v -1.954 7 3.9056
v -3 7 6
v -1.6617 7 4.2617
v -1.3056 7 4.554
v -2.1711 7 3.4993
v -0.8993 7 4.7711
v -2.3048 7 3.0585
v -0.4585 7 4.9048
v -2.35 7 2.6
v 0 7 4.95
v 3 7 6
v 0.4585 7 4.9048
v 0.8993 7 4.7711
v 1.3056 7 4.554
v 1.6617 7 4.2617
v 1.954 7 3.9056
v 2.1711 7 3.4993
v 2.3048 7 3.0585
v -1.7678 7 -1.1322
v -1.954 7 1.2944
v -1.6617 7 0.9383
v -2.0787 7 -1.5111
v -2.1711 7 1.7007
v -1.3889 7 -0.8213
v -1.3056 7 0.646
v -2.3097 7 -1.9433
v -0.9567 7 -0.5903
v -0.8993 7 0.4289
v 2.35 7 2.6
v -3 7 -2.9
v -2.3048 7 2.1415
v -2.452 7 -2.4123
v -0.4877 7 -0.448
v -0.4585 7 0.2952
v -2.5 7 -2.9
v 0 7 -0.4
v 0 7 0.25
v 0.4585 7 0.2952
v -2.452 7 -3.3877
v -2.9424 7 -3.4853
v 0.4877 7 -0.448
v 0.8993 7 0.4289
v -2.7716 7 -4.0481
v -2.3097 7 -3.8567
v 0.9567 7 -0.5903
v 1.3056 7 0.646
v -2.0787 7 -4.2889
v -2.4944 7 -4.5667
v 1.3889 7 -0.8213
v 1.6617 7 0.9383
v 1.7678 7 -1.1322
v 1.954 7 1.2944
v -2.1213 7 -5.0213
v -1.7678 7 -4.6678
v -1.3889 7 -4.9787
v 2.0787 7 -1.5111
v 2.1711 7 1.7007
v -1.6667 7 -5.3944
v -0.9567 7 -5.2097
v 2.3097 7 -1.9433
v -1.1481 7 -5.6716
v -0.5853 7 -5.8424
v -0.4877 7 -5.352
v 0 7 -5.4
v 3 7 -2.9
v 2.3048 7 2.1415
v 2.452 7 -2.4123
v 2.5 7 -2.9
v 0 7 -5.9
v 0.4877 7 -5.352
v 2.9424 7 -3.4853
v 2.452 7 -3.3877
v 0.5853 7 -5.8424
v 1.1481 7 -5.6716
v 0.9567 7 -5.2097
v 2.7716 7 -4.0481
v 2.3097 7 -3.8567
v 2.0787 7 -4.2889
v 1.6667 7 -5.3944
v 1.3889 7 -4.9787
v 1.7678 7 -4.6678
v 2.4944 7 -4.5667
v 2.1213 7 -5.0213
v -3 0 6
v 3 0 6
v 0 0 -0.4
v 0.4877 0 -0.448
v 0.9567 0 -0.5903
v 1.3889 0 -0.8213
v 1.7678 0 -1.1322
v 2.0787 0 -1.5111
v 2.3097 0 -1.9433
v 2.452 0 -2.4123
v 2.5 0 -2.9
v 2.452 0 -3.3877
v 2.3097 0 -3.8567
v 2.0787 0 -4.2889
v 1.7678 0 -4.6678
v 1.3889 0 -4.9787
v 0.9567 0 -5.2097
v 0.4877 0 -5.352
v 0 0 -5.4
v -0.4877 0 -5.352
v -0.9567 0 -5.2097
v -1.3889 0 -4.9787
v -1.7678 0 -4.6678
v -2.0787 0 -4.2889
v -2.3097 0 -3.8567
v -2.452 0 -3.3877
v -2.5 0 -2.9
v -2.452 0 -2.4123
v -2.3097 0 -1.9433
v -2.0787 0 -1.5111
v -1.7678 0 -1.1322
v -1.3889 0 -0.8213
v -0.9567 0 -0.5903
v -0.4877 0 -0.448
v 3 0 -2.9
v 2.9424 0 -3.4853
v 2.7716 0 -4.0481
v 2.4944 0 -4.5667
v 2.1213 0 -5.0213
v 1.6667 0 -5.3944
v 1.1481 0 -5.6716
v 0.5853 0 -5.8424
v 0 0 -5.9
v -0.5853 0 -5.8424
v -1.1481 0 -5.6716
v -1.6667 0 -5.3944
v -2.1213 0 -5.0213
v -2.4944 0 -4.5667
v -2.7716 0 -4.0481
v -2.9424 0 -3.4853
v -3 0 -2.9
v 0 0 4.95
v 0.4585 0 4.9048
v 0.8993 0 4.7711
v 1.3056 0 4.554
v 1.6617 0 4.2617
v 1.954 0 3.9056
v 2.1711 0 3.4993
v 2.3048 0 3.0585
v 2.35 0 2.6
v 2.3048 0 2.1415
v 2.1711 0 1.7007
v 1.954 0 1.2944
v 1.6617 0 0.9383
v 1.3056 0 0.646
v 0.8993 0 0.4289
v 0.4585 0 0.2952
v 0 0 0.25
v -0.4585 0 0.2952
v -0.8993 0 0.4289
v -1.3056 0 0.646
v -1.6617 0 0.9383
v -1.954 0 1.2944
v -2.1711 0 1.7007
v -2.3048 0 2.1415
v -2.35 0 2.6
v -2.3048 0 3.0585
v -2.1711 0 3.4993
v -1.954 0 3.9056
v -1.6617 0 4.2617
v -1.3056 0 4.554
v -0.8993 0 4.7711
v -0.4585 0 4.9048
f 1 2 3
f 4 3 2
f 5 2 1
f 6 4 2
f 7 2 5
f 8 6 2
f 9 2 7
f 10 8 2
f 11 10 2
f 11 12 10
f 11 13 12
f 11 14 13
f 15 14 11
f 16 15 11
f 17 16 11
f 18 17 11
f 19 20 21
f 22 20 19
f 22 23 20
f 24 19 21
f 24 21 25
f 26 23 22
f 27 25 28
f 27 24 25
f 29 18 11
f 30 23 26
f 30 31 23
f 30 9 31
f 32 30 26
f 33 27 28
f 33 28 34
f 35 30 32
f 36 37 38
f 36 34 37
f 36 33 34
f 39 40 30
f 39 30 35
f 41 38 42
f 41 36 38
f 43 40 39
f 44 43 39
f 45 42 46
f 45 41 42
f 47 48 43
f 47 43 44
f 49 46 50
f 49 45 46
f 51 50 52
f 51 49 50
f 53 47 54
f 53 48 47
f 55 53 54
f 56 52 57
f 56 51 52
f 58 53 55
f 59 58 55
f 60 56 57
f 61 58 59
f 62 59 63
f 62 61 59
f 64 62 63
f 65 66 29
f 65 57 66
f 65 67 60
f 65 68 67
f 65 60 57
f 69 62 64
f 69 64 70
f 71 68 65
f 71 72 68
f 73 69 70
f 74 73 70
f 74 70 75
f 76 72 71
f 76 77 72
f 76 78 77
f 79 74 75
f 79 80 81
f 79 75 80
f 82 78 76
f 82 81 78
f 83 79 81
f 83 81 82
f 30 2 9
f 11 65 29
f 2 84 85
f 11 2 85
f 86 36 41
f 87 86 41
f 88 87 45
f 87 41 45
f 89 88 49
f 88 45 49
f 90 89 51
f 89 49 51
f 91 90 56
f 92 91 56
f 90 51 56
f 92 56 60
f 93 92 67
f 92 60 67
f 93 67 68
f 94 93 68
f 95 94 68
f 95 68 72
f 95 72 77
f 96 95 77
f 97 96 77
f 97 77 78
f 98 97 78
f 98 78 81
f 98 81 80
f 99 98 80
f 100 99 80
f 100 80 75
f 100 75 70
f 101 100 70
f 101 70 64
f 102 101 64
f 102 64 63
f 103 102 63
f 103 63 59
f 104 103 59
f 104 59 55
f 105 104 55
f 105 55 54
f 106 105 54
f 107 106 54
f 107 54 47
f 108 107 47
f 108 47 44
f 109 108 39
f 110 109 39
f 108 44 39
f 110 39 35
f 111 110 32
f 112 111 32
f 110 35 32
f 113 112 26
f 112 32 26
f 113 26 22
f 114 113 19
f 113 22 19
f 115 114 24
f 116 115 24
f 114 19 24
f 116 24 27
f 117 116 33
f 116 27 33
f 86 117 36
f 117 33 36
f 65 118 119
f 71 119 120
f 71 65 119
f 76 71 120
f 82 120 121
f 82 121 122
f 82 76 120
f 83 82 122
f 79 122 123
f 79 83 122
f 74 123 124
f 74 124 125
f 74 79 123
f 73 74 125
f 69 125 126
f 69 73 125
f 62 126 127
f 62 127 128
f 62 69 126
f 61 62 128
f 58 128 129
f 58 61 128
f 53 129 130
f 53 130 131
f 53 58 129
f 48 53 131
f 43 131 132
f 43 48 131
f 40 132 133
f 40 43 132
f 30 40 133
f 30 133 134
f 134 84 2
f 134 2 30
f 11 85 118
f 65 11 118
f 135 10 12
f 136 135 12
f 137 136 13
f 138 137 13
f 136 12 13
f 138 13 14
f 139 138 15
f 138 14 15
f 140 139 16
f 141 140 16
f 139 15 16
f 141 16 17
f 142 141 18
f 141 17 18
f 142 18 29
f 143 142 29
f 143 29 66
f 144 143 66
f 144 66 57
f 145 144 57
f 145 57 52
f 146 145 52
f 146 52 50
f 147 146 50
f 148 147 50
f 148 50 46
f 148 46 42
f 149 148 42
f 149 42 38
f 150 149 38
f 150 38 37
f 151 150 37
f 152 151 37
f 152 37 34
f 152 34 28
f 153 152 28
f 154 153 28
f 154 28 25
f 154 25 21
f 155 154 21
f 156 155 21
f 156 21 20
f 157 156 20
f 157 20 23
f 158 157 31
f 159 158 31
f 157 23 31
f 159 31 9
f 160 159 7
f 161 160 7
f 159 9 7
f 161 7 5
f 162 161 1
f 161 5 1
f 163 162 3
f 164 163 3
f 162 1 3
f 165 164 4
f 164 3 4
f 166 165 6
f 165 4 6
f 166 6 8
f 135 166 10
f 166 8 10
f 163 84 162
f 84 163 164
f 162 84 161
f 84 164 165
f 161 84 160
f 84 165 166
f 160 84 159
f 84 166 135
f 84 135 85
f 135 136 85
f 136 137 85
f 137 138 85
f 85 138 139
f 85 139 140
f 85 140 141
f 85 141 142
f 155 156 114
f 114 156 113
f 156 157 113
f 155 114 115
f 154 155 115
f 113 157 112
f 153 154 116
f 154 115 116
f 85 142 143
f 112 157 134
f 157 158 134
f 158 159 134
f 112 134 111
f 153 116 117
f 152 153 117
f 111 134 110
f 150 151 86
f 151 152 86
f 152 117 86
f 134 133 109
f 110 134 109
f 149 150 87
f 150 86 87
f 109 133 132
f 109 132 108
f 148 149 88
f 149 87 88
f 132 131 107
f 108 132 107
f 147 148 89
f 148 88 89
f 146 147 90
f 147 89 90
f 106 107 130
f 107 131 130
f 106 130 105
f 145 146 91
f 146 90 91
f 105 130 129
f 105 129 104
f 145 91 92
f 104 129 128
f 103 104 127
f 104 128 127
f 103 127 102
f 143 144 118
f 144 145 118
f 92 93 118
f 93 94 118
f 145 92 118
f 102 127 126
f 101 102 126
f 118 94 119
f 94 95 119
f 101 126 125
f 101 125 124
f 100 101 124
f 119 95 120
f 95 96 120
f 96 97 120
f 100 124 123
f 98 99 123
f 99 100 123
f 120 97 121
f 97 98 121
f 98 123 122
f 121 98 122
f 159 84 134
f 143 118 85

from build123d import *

# Parameters (mm, degrees)
SKETCH4_W           = 6
SKETCH4_H           = 12
BOSS_EXTRUDE2_DEPTH = 7
SKETCH5_R           = 2.35
SKETCH5_R_2         = 2.5
CUT_EXTRUDE2_DEPTH  = 10.695359715
CUT_EXTRUDE3_DEPTH  = 10.695359715


with BuildPart() as part:
    # Sketch4 → Boss-Extrude2 (new body)
    with BuildSketch(Plane(origin=(0, 0, 0), x_dir=(1, 0, 0), z_dir=(0, 1, 0))):
        Rectangle(SKETCH4_W, SKETCH4_H)
    extrude(amount=BOSS_EXTRUDE2_DEPTH)

    # Sketch5 → Cut-Extrude2 (cut, through all)
    with BuildSketch(Plane(origin=(0, 7, 0), x_dir=(1, 0, 0), z_dir=(0, 1, 0))):
        with Locations(Location((0, -2.6, 0), (0, 0, 270))):
            Circle(SKETCH5_R)
        with Locations(Location((0, 2.9, 0), (0, 0, 270))):
            Circle(SKETCH5_R_2)
    extrude(amount=-CUT_EXTRUDE2_DEPTH, mode=Mode.SUBTRACT)

    # Sketch7 → Cut-Extrude3 (cut, through all)
    with BuildSketch(Plane(origin=(0, 7, 0), x_dir=(1, 0, 0), z_dir=(0, 1, 0))):
        with BuildLine():
            Line((-3, 2.9), (-3, 6))
            Line((-3, 6), (3, 6))
            Line((3, 6), (3, 2.9))
            ThreePointArc((3, 2.9), (0, 5.9), (-3, 2.9))
        make_face()
    extrude(amount=-CUT_EXTRUDE3_DEPTH, mode=Mode.SUBTRACT)


solid = part.part
